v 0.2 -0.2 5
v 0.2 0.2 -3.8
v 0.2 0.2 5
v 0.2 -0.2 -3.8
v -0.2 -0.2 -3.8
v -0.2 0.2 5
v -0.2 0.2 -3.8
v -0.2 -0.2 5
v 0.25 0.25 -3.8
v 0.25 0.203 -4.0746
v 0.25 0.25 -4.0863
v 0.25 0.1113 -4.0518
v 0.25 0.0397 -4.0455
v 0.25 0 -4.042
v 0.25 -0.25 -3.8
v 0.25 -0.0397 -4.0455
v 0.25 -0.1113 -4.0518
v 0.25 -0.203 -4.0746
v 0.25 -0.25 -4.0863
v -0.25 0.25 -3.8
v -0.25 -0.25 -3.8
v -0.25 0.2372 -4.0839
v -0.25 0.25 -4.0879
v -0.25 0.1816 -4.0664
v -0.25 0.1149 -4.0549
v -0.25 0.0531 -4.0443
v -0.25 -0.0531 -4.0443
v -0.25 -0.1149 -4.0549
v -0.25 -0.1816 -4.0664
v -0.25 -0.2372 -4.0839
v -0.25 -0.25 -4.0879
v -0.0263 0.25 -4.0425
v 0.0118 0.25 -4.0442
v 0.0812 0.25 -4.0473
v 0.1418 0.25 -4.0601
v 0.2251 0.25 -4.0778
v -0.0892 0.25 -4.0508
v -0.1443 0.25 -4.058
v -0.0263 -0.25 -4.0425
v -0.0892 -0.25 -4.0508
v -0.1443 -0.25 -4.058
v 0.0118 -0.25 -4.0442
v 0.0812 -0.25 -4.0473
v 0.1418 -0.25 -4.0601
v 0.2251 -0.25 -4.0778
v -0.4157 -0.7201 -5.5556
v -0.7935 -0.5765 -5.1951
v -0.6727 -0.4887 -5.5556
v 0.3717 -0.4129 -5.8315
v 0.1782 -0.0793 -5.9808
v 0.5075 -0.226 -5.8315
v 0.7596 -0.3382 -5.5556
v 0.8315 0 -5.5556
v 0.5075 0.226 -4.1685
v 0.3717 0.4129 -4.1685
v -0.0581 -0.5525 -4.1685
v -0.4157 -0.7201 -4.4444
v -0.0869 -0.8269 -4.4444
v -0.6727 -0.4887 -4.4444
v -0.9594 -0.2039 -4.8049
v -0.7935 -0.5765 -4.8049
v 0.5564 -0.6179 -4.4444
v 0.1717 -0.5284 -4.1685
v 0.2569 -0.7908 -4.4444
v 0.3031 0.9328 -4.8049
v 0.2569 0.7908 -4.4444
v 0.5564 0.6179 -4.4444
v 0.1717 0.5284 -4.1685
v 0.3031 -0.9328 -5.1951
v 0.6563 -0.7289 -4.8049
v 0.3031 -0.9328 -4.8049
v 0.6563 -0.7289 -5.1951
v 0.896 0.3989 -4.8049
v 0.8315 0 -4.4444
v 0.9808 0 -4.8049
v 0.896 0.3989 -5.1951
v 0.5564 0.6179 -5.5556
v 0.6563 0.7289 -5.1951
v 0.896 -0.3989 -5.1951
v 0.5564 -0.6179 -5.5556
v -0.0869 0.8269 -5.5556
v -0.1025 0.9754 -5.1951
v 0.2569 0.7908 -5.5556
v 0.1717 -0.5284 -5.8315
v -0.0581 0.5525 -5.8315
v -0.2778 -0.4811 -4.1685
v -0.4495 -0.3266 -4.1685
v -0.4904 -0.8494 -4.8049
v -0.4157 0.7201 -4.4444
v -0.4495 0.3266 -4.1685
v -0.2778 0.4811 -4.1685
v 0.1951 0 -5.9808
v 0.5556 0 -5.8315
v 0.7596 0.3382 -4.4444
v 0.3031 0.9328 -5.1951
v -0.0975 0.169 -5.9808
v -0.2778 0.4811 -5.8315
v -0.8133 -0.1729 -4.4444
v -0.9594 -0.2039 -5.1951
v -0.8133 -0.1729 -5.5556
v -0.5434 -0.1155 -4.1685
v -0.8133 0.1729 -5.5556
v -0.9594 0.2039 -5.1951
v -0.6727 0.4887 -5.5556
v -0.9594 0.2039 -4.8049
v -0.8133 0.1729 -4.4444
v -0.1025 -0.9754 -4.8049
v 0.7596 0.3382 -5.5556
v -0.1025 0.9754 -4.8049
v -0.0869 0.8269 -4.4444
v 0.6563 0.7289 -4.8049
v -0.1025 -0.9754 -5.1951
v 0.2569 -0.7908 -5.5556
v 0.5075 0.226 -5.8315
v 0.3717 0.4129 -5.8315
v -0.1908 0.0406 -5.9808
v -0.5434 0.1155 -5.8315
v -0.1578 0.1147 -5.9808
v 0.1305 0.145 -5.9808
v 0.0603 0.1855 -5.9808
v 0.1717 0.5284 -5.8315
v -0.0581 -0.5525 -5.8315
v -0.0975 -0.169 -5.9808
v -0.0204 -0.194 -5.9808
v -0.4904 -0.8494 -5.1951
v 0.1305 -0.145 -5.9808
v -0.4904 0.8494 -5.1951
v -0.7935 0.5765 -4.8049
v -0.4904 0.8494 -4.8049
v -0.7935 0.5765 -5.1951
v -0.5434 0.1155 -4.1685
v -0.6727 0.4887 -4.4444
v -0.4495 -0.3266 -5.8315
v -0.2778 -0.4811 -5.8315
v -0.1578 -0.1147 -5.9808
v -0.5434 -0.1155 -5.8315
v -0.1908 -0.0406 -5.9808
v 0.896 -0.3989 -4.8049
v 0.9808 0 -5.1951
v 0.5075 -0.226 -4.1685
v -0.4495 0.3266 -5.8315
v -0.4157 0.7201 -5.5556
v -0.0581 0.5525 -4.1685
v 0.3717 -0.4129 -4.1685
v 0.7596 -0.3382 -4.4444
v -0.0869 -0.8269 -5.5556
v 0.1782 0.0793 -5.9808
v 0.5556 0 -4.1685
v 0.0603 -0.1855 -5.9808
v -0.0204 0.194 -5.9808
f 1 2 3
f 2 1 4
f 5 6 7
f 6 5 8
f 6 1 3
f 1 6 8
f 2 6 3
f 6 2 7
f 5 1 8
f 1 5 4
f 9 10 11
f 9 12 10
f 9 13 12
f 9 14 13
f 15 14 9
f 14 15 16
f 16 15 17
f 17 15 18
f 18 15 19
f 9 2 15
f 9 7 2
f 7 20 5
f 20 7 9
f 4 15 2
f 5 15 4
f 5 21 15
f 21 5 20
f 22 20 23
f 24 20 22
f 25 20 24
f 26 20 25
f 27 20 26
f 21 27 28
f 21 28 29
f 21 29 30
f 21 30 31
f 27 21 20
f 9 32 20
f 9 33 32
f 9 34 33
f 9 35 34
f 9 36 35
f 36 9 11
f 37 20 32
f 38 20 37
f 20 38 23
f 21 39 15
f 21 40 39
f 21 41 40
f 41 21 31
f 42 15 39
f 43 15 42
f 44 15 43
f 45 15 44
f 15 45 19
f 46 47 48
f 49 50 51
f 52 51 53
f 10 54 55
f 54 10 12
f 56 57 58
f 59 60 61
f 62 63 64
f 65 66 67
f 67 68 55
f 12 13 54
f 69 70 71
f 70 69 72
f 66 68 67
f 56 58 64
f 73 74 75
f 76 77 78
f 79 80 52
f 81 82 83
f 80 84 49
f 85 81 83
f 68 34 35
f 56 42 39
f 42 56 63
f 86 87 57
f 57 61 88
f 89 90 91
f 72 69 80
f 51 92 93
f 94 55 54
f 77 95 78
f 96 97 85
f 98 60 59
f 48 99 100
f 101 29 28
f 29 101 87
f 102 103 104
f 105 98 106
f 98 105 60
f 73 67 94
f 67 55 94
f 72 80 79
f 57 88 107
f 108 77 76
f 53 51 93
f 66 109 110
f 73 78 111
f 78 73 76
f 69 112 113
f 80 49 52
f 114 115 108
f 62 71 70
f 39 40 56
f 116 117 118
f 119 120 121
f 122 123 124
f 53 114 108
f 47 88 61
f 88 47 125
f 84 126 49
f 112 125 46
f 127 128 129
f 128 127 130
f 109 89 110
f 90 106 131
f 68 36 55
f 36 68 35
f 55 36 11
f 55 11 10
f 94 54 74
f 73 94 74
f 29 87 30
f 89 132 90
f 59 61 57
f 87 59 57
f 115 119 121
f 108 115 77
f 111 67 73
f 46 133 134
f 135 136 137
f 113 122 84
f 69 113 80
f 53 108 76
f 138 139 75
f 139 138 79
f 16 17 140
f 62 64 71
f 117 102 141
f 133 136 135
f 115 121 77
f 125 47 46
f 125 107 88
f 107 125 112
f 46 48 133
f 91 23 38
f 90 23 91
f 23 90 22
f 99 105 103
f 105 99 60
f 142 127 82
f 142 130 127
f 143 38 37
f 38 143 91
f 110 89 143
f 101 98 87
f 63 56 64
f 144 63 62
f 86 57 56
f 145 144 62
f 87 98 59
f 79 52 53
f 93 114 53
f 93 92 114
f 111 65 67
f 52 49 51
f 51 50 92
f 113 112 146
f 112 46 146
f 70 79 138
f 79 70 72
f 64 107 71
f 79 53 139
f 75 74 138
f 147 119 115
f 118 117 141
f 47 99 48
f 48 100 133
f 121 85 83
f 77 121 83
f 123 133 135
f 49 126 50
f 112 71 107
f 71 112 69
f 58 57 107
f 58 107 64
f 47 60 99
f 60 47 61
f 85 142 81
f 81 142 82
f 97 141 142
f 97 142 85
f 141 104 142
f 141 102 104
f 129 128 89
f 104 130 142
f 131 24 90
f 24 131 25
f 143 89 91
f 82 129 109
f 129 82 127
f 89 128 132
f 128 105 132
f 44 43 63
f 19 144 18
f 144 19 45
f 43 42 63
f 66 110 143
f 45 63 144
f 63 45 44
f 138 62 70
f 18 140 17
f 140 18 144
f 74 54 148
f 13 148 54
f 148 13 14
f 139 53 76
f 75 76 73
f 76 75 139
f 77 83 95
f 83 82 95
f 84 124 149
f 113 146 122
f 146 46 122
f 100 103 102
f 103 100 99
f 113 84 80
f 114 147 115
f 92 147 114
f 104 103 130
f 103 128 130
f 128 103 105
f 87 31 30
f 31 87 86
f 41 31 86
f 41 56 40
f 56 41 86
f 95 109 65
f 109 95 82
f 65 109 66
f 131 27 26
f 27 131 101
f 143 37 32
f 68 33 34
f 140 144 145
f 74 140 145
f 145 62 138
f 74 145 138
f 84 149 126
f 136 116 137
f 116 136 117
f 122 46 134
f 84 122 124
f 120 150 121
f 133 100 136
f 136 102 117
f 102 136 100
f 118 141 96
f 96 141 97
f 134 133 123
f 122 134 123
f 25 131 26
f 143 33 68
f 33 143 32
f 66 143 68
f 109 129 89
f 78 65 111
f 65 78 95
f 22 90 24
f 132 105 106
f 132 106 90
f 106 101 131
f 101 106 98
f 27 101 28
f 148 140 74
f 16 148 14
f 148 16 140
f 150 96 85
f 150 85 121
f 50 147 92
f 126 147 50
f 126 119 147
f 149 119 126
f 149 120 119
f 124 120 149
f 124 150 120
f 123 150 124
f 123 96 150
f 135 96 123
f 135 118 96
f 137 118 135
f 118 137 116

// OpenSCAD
color("brown")
rotate([0,90,0])
cube([10,0.4,0.4], center = true);


color("gray")
translate([0,0,-4])
rotate([0,0,0])
cube([0.5,0.5,0.4], center = true, $fn=10);


color("brown")
translate([0,0,-5])
rotate([0,0,0])
sphere([10,1,1], center = true, $fn=15);
